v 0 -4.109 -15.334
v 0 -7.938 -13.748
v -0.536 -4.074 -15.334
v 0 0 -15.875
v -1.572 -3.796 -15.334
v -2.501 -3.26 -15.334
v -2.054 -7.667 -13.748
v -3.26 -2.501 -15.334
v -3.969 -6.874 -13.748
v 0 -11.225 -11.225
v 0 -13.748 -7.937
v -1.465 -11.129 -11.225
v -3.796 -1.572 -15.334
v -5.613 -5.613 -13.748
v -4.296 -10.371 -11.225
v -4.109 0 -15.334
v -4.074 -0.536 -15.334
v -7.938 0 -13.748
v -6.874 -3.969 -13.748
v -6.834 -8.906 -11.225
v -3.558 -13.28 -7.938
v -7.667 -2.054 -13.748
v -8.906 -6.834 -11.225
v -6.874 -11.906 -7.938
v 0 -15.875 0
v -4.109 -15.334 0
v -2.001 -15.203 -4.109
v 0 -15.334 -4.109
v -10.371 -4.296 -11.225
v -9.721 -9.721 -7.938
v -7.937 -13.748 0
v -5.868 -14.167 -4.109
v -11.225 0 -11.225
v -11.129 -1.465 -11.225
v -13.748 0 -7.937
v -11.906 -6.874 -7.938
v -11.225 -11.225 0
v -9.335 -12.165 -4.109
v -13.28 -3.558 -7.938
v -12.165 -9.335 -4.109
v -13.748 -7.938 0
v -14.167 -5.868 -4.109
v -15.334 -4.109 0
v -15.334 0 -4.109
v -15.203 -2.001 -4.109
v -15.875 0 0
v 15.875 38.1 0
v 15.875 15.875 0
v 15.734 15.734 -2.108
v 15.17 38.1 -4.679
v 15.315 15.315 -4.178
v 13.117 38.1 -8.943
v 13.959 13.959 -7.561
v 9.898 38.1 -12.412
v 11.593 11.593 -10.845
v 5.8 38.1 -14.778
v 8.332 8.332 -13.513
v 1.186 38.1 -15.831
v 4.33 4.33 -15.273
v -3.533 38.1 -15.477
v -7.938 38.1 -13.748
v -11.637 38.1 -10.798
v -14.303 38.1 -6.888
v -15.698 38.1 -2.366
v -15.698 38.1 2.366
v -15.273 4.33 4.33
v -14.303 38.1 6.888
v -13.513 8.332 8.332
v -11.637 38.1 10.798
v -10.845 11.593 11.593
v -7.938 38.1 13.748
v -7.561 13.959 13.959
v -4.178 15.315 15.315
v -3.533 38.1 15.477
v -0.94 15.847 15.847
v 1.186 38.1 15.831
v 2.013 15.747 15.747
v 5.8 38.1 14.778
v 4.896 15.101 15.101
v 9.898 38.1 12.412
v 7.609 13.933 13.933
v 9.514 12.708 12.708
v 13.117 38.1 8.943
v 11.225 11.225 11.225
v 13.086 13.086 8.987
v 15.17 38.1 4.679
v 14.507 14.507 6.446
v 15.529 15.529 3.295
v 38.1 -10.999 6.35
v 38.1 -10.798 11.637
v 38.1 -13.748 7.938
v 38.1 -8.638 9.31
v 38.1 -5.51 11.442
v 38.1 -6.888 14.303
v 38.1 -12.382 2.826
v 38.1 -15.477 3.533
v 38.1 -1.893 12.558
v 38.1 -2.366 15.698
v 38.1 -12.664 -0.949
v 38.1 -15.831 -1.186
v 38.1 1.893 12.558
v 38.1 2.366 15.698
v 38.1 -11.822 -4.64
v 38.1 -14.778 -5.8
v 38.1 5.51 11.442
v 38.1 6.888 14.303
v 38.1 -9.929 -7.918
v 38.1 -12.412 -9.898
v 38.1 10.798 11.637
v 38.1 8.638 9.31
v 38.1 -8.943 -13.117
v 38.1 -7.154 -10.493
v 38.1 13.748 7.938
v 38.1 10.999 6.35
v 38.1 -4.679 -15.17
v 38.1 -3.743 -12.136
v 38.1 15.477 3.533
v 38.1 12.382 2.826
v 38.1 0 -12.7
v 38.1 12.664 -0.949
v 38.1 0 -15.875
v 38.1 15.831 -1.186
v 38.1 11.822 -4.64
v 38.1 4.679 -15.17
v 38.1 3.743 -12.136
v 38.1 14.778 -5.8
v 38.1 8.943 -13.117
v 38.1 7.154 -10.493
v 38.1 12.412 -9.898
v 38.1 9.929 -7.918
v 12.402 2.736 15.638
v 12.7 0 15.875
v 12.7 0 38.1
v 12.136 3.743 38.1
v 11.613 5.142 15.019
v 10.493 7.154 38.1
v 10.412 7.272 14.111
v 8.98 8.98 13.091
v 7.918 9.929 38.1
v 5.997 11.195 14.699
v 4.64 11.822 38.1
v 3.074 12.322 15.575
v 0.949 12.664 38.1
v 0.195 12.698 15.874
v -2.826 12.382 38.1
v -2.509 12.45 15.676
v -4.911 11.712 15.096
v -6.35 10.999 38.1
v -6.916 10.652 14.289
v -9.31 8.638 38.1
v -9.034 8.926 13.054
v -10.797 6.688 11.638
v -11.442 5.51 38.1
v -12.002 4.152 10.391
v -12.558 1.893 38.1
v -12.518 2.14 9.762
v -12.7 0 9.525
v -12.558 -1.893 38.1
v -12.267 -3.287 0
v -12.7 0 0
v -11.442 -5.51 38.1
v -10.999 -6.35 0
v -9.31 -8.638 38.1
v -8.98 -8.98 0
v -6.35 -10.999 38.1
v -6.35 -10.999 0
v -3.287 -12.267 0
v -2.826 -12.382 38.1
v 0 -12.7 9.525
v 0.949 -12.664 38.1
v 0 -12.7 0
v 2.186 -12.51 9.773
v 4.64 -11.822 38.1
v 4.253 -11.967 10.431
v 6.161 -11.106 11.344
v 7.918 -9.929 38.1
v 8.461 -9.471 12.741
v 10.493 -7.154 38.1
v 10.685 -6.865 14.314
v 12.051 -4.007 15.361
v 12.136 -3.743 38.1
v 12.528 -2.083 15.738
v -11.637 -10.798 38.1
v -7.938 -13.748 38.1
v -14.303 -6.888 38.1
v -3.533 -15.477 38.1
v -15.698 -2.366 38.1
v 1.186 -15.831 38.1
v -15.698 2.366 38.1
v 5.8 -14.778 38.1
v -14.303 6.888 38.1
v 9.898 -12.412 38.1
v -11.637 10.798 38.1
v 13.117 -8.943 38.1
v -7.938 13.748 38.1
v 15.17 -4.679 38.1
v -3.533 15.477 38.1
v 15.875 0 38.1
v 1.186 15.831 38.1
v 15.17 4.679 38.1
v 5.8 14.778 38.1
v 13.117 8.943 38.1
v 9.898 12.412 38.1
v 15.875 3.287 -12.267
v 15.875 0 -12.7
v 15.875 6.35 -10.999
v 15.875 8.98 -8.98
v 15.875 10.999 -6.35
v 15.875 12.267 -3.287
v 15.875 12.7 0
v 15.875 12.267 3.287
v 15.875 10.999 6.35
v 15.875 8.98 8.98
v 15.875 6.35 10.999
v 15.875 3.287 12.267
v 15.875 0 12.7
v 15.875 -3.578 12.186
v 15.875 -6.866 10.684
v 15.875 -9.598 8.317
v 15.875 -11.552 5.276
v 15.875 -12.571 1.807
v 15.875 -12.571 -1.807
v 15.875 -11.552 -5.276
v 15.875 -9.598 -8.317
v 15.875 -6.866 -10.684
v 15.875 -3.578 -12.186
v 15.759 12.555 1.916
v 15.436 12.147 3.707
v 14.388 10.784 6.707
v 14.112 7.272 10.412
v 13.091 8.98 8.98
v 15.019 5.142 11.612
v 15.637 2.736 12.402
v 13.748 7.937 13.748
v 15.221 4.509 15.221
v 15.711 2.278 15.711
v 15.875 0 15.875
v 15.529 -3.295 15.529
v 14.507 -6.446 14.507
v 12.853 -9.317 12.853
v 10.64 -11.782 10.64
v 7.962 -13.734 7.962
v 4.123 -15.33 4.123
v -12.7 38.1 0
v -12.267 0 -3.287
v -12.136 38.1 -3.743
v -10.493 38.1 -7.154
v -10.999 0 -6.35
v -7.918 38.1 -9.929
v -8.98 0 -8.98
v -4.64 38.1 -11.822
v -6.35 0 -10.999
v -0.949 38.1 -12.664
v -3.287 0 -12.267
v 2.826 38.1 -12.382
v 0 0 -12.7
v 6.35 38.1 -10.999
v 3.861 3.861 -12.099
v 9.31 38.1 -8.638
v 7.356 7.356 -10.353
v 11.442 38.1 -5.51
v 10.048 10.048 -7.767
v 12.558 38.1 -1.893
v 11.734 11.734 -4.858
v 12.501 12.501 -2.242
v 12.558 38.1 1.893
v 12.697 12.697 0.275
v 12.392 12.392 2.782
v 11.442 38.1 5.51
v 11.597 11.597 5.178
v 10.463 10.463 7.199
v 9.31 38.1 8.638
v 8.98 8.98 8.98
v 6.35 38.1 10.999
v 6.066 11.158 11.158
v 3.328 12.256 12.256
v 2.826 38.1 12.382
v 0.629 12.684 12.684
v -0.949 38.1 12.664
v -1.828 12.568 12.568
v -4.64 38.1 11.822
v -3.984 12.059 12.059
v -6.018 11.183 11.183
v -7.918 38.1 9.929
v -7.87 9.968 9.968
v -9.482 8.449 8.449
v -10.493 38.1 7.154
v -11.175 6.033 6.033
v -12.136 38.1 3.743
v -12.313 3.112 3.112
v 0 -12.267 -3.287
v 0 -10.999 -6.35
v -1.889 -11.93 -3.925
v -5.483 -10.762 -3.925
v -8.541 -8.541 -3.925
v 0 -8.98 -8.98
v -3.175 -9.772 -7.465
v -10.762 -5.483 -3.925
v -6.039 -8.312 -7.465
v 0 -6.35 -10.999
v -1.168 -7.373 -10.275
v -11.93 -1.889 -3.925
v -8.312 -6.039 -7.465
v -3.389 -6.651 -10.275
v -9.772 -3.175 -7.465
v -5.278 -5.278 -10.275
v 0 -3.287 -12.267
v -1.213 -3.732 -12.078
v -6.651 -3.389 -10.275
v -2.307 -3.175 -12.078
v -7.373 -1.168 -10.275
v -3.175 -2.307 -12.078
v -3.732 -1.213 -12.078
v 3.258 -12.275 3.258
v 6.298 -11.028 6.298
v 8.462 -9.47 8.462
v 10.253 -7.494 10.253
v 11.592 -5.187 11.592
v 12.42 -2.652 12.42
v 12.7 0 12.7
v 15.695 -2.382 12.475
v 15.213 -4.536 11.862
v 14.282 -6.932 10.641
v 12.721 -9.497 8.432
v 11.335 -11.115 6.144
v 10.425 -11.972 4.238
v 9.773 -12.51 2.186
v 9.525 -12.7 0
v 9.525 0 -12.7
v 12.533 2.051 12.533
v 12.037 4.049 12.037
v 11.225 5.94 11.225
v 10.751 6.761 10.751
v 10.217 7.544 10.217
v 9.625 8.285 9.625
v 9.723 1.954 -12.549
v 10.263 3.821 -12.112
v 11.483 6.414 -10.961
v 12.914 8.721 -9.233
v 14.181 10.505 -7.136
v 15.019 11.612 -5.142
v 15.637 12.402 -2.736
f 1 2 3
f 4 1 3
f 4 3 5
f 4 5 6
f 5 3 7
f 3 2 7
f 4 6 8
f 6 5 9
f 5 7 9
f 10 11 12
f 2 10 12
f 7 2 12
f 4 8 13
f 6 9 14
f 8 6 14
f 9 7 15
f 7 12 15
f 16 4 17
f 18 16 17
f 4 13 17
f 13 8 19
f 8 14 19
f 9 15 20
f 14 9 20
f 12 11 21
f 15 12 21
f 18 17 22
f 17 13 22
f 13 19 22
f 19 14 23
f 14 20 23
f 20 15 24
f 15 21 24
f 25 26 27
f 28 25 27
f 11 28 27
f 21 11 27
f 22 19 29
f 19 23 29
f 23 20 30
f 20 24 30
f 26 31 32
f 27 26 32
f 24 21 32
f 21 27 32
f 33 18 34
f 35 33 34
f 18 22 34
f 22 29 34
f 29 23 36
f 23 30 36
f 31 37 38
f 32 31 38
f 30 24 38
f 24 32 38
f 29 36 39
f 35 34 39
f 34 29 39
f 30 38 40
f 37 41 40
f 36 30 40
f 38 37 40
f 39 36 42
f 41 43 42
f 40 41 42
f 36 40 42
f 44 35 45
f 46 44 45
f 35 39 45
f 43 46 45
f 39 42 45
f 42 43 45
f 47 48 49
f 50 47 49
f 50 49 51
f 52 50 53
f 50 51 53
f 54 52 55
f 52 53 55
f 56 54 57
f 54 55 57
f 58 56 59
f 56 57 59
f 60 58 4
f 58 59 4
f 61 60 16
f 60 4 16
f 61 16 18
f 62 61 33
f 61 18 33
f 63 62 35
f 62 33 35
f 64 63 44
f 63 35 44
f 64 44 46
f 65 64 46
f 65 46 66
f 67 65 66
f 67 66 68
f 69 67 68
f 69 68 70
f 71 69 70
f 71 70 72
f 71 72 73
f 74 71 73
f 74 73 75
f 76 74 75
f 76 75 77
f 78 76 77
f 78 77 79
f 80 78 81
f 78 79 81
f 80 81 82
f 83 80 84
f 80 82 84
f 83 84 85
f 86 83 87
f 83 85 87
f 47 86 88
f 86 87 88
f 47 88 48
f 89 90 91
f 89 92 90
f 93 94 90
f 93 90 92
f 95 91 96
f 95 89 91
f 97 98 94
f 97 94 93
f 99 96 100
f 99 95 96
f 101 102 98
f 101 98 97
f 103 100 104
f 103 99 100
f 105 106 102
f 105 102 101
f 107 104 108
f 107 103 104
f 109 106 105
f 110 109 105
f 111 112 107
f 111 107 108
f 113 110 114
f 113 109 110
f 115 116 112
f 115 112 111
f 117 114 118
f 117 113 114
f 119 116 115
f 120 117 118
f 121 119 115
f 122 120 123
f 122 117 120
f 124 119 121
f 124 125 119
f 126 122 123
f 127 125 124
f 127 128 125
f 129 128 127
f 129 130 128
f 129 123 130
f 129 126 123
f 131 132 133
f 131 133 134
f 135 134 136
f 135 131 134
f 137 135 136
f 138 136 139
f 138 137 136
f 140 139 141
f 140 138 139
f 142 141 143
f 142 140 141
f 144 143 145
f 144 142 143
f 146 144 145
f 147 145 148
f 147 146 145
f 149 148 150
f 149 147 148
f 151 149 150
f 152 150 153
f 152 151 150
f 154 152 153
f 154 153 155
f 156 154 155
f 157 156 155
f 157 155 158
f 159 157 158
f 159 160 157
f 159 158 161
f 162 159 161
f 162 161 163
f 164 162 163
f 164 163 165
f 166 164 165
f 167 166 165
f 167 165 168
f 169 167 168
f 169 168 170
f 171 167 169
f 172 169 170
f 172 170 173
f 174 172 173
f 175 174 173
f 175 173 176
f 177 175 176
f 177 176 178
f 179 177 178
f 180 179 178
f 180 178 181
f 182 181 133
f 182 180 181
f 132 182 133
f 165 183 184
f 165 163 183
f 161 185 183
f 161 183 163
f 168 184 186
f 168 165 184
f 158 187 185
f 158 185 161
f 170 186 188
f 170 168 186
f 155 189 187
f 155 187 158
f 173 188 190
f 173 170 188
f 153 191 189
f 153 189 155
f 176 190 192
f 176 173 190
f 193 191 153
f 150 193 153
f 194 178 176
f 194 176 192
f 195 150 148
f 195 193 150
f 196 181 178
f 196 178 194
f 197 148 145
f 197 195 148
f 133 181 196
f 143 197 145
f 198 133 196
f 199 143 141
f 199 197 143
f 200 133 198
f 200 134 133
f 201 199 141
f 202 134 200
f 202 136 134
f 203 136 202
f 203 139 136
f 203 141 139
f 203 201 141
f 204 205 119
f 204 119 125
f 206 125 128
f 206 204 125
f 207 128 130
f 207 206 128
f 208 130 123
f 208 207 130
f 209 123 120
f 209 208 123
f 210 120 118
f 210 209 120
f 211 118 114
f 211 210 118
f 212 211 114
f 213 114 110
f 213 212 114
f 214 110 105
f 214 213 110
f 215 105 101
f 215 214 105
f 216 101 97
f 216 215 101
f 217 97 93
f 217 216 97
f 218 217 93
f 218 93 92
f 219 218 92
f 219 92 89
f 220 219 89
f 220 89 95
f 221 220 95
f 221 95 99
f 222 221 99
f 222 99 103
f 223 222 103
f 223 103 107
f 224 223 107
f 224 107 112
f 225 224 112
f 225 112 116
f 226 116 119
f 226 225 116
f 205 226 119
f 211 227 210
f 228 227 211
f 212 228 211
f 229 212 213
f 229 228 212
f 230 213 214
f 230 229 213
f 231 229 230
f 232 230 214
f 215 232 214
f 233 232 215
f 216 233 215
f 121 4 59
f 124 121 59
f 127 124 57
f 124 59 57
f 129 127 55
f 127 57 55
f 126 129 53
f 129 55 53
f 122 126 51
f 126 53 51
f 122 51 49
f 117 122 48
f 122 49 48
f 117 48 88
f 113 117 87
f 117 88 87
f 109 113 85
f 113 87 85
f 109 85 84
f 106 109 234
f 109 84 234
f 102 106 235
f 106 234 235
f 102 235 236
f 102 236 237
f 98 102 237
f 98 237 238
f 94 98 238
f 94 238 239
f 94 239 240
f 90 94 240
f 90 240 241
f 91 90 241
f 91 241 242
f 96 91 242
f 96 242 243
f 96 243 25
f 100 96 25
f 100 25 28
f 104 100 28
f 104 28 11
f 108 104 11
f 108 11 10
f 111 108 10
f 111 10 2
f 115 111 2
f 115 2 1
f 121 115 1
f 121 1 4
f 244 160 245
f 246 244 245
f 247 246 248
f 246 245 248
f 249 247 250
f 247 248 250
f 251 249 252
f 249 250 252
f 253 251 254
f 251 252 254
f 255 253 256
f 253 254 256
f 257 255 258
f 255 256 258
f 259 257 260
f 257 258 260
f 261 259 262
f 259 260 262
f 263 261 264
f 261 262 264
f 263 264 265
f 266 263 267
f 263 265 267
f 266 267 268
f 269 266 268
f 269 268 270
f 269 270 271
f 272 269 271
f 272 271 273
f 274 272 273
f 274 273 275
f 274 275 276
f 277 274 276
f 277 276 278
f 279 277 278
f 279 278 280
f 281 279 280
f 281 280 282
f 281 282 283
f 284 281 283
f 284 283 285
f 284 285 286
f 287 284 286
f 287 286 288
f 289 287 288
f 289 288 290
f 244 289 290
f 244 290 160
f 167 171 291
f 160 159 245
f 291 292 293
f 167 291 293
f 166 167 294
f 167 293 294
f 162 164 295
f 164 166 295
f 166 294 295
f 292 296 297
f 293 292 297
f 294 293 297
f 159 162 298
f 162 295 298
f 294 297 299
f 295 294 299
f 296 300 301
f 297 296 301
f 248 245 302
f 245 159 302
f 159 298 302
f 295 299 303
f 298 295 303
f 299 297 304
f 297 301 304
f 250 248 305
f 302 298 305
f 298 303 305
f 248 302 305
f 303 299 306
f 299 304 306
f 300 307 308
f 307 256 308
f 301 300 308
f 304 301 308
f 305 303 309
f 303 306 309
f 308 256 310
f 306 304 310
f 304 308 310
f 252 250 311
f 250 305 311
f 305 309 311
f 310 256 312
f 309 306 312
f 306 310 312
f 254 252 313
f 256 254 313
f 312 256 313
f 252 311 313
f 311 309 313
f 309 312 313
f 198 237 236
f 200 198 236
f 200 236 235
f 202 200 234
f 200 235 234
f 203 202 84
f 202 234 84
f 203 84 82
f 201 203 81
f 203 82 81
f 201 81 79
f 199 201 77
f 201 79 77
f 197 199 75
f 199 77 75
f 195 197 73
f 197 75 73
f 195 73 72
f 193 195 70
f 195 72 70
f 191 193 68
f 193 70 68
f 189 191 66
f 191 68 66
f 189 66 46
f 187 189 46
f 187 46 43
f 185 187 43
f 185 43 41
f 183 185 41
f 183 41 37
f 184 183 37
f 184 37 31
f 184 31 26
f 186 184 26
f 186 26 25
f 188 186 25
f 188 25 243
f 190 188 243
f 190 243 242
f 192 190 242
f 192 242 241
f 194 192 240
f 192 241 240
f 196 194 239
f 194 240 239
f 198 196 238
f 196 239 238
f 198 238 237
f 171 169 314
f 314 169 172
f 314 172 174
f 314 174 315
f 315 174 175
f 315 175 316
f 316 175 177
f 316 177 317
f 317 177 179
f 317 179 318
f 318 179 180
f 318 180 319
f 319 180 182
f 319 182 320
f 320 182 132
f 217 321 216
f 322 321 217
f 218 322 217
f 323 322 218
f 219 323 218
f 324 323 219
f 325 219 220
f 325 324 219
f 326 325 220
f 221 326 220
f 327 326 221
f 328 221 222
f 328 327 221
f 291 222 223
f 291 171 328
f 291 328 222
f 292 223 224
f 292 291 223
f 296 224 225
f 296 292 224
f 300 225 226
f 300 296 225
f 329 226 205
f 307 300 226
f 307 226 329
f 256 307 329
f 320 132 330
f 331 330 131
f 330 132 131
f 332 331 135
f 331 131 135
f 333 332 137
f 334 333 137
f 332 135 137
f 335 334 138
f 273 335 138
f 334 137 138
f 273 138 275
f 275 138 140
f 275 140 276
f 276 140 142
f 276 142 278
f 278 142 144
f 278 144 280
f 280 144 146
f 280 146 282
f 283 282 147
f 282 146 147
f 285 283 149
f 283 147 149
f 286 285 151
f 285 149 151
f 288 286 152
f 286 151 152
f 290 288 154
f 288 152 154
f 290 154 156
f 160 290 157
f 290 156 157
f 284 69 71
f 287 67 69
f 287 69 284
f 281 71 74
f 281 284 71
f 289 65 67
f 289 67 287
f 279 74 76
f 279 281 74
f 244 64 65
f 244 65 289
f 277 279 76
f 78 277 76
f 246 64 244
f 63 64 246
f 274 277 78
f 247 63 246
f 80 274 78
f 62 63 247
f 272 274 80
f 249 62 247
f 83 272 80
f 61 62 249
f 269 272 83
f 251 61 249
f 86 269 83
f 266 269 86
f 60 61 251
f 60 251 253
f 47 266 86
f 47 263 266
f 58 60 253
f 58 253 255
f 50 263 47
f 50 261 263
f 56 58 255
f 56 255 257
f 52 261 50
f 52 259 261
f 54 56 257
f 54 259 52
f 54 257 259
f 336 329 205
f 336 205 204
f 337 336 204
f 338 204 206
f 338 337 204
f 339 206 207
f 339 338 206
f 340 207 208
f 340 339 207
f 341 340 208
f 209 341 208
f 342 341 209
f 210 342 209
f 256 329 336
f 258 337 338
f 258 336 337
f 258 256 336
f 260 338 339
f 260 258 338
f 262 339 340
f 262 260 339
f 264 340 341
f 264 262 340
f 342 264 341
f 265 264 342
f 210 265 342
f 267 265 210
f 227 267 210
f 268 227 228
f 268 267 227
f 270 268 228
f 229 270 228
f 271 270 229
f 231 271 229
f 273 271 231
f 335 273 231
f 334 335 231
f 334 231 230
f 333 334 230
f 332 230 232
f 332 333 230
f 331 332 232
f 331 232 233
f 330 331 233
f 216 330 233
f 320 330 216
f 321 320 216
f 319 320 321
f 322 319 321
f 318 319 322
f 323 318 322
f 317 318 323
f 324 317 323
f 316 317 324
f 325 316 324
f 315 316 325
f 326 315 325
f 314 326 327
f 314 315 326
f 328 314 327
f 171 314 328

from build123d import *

# Parameters (mm, degrees)
SKETCH1_R           = 15.875
SKETCH1_R_2         = 12.7
BOSS_EXTRUDE1_DEPTH = 38.1
BOSS_EXTRUDE2_DEPTH = 38.1
SKETCH3_R           = 15.875
SKETCH3_R_2         = 12.7
BOSS_EXTRUDE3_DEPTH = 38.1
REVOLVE1_ANGLE      = 90
SKETCH5_R           = 12.7
CUT_EXTRUDE1_DEPTH  = 38.1
SKETCH6_R           = 12.7
CUT_EXTRUDE2_DEPTH  = 38.1
CUT_EXTRUDE3_START  = -38.1
SKETCH7_R           = 12.7
CUT_EXTRUDE3_DEPTH  = 15.875


with BuildPart() as part:
    # Sketch1 → Boss-Extrude1 (new body)
    with BuildSketch(Plane.XY):
        Circle(SKETCH1_R)
        Circle(SKETCH1_R_2, mode=Mode.SUBTRACT)
    extrude(amount=BOSS_EXTRUDE1_DEPTH)

    # Sketch2 → Boss-Extrude2 (add)
    with BuildSketch(Plane(origin=(0, 0, 0), x_dir=(1, 0, 0), z_dir=(0, 1, 0))):
        with BuildLine():
            ThreePointArc((-15.875, 0), (0, -15.875), (15.875, 0))
            Line((15.875, 0), (12.7, 0))
            ThreePointArc((12.7, 0), (0, -12.7), (-12.7, 0))
            Line((-12.7, 0), (-15.875, 0))
        make_face()
        with BuildLine():
            Line((12.7, 0), (15.875, 0))
            ThreePointArc((15.875, 0), (0, 15.875), (-15.875, 0))
            Line((-15.875, 0), (-12.7, 0))
            ThreePointArc((-12.7, 0), (0, 12.7), (12.7, 0))
        make_face()
        with BuildLine():
            ThreePointArc((-15.875, 0), (0, -15.875), (15.875, 0))
            Line((15.875, 0), (12.7, 0))
            ThreePointArc((12.7, 0), (0, -12.7), (-12.7, 0))
            Line((-12.7, 0), (-15.875, 0))
        make_face()
        with BuildLine():
            Line((12.7, 0), (15.875, 0))
            ThreePointArc((15.875, 0), (0, 15.875), (-15.875, 0))
            Line((-15.875, 0), (-12.7, 0))
            ThreePointArc((-12.7, 0), (0, 12.7), (12.7, 0))
        make_face()
    extrude(amount=BOSS_EXTRUDE2_DEPTH)

    # Sketch3 → Boss-Extrude3 (add)
    with BuildSketch(Plane(origin=(0, 0, 0), x_dir=(0, 0, -1), z_dir=(1, 0, 0))):
        Circle(SKETCH3_R)
        Circle(SKETCH3_R_2, mode=Mode.SUBTRACT)
    extrude(amount=BOSS_EXTRUDE3_DEPTH)

    # Sketch4 → Revolve1 (revolve)
    with BuildSketch(Plane.ZY):
        with BuildLine():
            ThreePointArc((-15.875, 0), (-11.225320151, -11.225320151), (0, -15.875))
            Line((0, -15.875), (0, -12.7))
            ThreePointArc((0, -12.7), (-8.980256121, -8.980256121), (-12.7, 0))
            Line((-12.7, 0), (-15.875, 0))
        make_face()
    revolve(axis=Axis((0, 0, -12.7), (0, 0, -1)), revolution_arc=REVOLVE1_ANGLE)

    # Sketch5 → Cut-Extrude1 (cut)
    with BuildSketch(Plane(origin=(0, 38.1, 0), x_dir=(1, 0, 0), z_dir=(0, 1, 0))):
        Circle(SKETCH5_R)
    extrude(amount=-CUT_EXTRUDE1_DEPTH, mode=Mode.SUBTRACT)

    # Sketch6 → Cut-Extrude2 (cut)
    with BuildSketch(Plane.XY.offset(38.1)):
        Circle(SKETCH6_R)
    extrude(amount=-CUT_EXTRUDE2_DEPTH, mode=Mode.SUBTRACT)

    # Sketch7 → Cut-Extrude3 (cut)
    with BuildSketch(Plane(origin=(38.1, 0, 0), x_dir=(0, 0, -1), z_dir=(1, 0, 0)).offset(CUT_EXTRUDE3_START)):
        Circle(SKETCH7_R)
    extrude(amount=CUT_EXTRUDE3_DEPTH, mode=Mode.SUBTRACT)


solid = part.part
